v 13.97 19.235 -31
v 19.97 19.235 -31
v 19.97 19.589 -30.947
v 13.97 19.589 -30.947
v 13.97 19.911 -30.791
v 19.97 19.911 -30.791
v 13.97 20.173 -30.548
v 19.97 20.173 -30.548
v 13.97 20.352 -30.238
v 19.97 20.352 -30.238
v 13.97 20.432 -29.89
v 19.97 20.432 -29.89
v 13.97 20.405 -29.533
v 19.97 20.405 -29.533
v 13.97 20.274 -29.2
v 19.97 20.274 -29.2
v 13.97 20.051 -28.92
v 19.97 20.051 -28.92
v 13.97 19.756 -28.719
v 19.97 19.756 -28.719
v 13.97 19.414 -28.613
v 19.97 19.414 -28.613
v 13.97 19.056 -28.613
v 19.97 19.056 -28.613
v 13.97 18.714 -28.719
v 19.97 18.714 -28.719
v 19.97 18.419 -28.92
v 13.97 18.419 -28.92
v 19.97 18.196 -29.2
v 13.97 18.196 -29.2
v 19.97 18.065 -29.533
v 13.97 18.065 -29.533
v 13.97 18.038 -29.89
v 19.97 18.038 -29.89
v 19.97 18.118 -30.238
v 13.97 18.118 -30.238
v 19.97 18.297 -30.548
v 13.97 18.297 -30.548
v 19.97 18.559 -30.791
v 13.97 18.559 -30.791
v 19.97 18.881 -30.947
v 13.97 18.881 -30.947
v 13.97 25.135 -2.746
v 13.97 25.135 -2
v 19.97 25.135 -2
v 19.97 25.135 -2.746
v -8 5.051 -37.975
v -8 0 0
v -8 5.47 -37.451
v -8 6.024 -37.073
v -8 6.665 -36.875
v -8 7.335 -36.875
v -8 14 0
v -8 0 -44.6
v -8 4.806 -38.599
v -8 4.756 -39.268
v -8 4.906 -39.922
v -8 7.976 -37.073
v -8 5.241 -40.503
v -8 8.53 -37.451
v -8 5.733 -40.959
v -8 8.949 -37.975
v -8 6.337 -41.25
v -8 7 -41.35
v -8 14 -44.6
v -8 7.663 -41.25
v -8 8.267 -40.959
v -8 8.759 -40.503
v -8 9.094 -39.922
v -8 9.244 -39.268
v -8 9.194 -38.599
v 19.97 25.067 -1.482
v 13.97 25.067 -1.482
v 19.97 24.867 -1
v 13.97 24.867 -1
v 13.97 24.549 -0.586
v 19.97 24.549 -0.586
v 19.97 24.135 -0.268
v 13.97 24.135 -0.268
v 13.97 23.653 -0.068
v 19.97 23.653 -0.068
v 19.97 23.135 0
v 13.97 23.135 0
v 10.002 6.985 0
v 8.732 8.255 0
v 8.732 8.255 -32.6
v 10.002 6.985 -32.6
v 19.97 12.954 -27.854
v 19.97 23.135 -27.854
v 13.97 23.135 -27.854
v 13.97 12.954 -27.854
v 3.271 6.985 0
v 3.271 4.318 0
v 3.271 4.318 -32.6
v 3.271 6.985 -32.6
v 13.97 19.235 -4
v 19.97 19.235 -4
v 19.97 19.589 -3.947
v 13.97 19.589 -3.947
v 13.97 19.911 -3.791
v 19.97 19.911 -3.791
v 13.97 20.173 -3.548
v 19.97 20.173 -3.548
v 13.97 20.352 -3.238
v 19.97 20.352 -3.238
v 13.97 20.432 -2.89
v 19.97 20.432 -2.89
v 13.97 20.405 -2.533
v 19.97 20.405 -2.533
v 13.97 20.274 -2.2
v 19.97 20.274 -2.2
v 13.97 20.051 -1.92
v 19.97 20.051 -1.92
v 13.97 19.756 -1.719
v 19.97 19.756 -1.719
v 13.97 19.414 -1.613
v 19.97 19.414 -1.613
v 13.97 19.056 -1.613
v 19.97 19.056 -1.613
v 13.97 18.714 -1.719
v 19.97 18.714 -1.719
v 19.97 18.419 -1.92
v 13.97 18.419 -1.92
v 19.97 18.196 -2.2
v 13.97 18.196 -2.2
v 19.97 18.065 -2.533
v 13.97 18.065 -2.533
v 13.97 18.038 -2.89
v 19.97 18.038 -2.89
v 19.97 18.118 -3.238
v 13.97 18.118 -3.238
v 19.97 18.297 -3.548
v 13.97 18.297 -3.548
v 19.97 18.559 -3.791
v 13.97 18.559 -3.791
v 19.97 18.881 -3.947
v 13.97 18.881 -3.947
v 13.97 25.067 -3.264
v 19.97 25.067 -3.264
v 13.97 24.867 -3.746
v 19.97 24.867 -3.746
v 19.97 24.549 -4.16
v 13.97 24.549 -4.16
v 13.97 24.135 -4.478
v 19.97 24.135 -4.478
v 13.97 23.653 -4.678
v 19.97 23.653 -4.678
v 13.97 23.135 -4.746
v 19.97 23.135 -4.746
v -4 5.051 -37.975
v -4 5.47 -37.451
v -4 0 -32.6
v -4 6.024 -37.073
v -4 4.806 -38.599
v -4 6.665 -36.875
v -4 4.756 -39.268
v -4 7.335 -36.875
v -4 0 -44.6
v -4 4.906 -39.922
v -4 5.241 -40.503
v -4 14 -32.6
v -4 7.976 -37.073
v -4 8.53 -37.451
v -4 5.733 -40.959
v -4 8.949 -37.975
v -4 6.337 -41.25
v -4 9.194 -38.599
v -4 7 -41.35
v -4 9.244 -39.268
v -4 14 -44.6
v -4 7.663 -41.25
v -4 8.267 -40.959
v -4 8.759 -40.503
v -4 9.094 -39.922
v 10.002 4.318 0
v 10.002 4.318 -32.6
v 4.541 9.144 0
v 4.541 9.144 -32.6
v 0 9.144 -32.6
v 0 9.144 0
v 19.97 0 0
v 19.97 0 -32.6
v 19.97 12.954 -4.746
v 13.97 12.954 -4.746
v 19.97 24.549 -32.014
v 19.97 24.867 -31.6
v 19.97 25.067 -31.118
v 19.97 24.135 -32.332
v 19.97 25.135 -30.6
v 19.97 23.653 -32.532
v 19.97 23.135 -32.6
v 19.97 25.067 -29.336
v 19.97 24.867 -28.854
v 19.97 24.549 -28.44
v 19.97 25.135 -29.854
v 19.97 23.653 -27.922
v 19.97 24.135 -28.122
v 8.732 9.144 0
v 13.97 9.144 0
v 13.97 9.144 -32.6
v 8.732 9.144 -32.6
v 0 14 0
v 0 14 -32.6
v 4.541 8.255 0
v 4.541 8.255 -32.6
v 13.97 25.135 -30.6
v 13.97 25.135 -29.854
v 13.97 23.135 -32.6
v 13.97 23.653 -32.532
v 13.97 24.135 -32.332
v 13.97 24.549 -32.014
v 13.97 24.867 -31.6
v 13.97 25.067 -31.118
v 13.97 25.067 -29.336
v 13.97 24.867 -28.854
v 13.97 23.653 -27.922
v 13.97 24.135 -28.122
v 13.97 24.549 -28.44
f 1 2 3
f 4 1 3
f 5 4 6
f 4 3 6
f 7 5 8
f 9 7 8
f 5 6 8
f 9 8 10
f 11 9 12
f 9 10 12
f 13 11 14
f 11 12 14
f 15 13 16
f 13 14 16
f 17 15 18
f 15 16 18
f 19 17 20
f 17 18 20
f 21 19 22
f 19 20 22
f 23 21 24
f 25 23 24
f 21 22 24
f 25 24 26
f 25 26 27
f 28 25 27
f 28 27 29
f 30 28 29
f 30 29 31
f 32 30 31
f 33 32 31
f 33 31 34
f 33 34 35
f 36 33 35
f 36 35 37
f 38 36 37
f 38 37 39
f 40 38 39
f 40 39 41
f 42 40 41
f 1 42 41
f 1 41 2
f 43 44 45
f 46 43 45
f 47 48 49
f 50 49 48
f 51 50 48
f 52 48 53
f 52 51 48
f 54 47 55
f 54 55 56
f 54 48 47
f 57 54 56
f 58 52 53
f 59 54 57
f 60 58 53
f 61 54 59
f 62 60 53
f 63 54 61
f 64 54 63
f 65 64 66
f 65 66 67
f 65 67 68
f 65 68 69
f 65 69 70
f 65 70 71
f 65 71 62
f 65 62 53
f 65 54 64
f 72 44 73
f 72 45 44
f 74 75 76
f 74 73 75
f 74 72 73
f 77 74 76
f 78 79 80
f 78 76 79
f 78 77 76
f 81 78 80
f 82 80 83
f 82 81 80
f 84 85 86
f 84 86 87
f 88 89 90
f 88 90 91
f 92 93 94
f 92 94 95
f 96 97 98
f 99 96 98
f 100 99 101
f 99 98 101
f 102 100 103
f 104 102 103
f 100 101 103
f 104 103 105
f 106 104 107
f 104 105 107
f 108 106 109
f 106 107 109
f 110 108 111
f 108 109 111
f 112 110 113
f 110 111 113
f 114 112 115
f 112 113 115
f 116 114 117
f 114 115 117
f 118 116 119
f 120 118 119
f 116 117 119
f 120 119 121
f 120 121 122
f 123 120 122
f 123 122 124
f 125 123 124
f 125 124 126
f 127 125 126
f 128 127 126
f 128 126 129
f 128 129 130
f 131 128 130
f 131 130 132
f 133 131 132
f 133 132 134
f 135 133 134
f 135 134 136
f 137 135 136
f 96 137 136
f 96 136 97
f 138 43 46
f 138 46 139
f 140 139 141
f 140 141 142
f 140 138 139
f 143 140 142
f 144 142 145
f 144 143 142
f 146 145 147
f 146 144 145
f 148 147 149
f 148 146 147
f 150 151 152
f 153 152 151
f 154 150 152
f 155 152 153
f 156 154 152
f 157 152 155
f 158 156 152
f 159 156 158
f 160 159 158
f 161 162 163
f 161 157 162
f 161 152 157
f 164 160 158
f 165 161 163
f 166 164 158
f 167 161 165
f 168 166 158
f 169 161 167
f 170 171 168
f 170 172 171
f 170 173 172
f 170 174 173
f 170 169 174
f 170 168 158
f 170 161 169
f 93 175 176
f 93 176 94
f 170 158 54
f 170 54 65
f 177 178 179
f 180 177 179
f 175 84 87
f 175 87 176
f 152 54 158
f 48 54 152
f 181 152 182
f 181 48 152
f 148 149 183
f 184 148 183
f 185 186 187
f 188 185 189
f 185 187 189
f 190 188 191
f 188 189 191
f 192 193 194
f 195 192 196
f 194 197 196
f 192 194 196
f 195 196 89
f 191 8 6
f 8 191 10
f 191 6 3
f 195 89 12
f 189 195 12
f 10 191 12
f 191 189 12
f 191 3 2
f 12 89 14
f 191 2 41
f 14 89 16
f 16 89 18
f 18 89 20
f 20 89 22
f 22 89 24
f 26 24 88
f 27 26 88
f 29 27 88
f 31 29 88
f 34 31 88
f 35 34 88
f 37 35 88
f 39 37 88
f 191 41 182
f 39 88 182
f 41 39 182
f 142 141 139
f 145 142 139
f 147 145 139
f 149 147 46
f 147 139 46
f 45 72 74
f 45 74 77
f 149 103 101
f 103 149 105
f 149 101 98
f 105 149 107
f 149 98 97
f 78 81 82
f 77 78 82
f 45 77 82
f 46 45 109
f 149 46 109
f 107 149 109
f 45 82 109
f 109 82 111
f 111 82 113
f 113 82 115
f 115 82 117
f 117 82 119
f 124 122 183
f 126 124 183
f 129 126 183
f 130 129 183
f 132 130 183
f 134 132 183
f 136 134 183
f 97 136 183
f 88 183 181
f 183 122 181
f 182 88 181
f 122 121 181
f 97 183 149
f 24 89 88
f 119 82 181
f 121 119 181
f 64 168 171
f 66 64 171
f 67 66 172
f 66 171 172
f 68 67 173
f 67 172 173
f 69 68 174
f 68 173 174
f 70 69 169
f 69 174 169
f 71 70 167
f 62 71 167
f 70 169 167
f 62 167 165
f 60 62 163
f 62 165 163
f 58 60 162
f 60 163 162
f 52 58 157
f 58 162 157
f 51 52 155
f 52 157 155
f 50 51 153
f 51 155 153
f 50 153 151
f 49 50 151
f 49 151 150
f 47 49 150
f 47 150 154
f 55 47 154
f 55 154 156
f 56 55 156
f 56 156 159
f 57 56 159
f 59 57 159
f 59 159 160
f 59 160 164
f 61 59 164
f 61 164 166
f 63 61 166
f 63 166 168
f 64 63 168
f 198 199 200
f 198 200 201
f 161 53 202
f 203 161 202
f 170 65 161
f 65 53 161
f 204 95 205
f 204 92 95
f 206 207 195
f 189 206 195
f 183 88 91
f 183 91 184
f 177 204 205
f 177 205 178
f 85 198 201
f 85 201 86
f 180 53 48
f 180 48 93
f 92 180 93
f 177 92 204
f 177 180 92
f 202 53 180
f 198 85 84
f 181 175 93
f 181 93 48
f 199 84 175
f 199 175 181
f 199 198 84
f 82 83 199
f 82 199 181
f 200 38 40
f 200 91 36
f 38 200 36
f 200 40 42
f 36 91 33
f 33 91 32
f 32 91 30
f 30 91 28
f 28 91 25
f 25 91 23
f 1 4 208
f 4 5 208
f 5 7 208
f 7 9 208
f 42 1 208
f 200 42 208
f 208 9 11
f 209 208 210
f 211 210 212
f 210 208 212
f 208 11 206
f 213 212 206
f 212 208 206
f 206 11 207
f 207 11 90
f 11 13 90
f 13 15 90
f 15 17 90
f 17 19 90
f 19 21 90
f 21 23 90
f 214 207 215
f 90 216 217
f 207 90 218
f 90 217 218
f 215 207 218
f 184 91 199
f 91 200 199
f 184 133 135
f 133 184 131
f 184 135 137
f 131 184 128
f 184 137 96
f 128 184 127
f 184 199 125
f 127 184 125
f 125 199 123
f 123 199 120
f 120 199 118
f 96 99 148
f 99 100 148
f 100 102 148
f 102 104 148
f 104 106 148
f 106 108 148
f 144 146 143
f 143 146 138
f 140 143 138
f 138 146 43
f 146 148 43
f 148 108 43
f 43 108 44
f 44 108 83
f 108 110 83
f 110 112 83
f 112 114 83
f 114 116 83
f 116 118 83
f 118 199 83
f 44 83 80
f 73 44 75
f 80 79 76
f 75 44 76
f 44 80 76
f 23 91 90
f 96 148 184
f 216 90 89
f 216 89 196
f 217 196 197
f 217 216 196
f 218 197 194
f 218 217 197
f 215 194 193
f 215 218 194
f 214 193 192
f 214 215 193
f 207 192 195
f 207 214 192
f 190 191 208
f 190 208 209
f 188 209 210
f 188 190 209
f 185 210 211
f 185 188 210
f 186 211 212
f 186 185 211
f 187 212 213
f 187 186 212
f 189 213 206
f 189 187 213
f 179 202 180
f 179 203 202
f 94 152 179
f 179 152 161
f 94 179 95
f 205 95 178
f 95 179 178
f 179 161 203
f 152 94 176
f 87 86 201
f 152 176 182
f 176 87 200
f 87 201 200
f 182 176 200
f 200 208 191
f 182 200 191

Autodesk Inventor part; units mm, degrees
ref_plane "YZ Plane" through (0, 0, 0) normal (1, 0, 0) x (0, 1, 0)
ref_plane "XZ Plane" through (0, 0, 0) normal (0, 1, 0) x (-1, 0, 0)
ref_plane "XY Plane" through (0, 0, 0) normal (0, 0, 1) x (1, 0, 0)
sketch "Náčrt1" plane through (0, 0, 0) normal (0, 0, 1) x (1, 0, 0)
  line L0 (13.97, 23.865) -> (13.97, 9.144)
  line L1 (0, 9.144) -> (0, 0)
  line L2 (4.5409, 9.144) -> (0, 9.144)
  line L3 (4.5409, 8.255) -> (4.5409, 9.144)
  line L4 (3.2709, 6.985) -> (4.5409, 8.255)
  line L5 (3.2709, 4.318) -> (3.2709, 6.985)
  line L6 (8.7319, 9.144) -> (8.7319, 8.255)
  line L7 (13.97, 9.144) -> (8.7319, 9.144)
  line L8 (8.7319, 8.255) -> (10.0019, 6.985)
  line L9 (10.0019, 6.985) -> (10.0019, 4.318)
  line L10 (10.0019, 4.318) -> (3.2709, 4.318)
  line L11 (0, 0) -> (19.97, 0)
  line L12 (13.97, 22.5956) -> (13.97, 25.1349)
  line L13 (13.97, 20.4353) -> (13.97, 18.035)
  line L14 (13.97, 25.1349) -> (19.97, 25.1349)
  line L15 (19.97, 25.1349) -> (19.97, 0)
extrude "Vysunutí1" add sketch "Náčrt1" against normal blind 32.6
sketch "Náčrt2" plane through (19.97, 0, 0) normal (1, 0, 0) x (0, 0, -1)
  line L0 (0, 25.1349) -> (32.6, 25.1349) projected
  line L1 (16.3, 25.1349) -> (4.746, 25.1349)
  line L2 (4.746, 25.1349) -> (4.746, 12.9539)
  line L3 (16.3, 25.1349) -> (27.854, 25.1349)
  line L4 (27.854, 25.1349) -> (27.854, 12.9539)
  line L5 (27.854, 12.9539) -> (4.746, 12.9539)
  circle A0 centre (2.8, 19.2349) radius 1.2
  line L6 (16.3, 25.1349) -> (16.3, 15.9225)
  circle A1 centre (29.8, 19.2349) radius 1.2
  point P0 (0, 0)
  point P1 (4.746, 19.0444)
  dimension "d2" = 11.554
  dimension "d3" = 12.181
  dimension "d4" = 11.554
  dimension "d7" = 2.4
  dimension "d8" = 5.9
  dimension "d9" = 1.946
extrude "Vysunutí2" cut sketch "Náčrt2" against normal blind 32.6 contours L0 L4 L5 L2
extrude "Vysunutí3" cut sketch "Náčrt2" against normal blind 32.6 contours A0 | A1
fillet "Zaoblení1" radius 2 4 edges at (16.97, 25.1349, 0) (16.97, 25.1349, -4.746) (16.97, 25.1349, -27.854) (16.97, 25.1349, -32.6)
sketch "Náčrt3" plane through (0, 0, 0) normal (0, -1, 0) x (1, 0, 0)
  point P0 (0, 0)
sketch "Náčrt4" plane through (0, 0, 0) normal (0, 0, 1) x (1, 0, 0)
  line L0 (13.97, 23.1349) -> (19.97, 23.1349) projected
  line L1 (13.97, 23.1349) -> (13.97, 9.144) projected
  line L2 (13.97, 9.144) -> (8.7319, 9.144) projected
  line L3 (8.7319, 9.144) -> (8.7319, 8.255) projected
  line L4 (8.7319, 8.255) -> (10.0019, 6.985) projected
  line L5 (10.0019, 6.985) -> (10.0019, 4.318) projected
  line L6 (10.0019, 4.318) -> (3.2709, 4.318) projected
  line L7 (3.2709, 4.318) -> (3.2709, 6.985) projected
  line L8 (3.2709, 6.985) -> (4.5409, 8.255) projected
  line L9 (4.5409, 8.255) -> (4.5409, 9.144) projected
  line L10 (4.5409, 9.144) -> (0, 9.144) projected
  line L11 (0, 9.144) -> (0, 0) projected
  line L12 (0, 0) -> (19.97, 0) projected
  line L13 (19.97, 0) -> (19.97, 23.1349) projected
  line L14 (0, 0) -> (-8, 0)
  line L15 (-8, 0) -> (-8, 14)
  line L16 (-8, 14) -> (0, 14)
  line L17 (0, 14) -> (0, 0)
  dimension "d13" = 14
  dimension "d14" = 8
extrude "Vysunutí4" add sketch "Náčrt4" along normal blind 12 and the other way blind 32.6 contours L14 L15 L16 L17 L11
sketch "Náčrt5" plane through (0, 0, 0) normal (1, 0, 0) x (0, 0, -1)
  line L0 (0, 9.144) -> (0, 0) projected
  line L1 (0, 9.144) -> (32.6, 9.144) projected
  line L2 (32.6, 14) -> (32.6, 9.144) projected
  line L3 (32.6, 14) -> (-12, 14) projected
  line L4 (-12, 0) -> (-12, 14) projected
  line L5 (0, 0) -> (-12, 0) projected
  circle A0 centre (-6.5, 7) radius 2.25
  line L6 (27.854, 12.9539) -> (4.746, 12.9539) projected
  line L7 (16.3, 12.9539) -> (16.3, -5.3216)
  line L8 (32.6, 9.144) -> (32.6, 0)
  line L9 (44.6, 0) -> (44.6, 14)
  line L10 (32.6, 0) -> (44.6, 0)
  circle A1 centre (39.1, 7) radius 2.25
  line L11 (44.6, 14) -> (32.6, 14)
  line L12 (32.6, 14) -> (32.6, 0)
  dimension "d19" = 4.5
  dimension "d20" = 7
  dimension "d21" = 5.5
extrude "Vysunutí5" add sketch "Náčrt5" against normal up to surface (8 mm away) contours L2 L11 L9 L10 L8 | A0
sketch "Náčrt6" plane through (0, 0, 12) normal (0, 0, 1) x (1, 0, 0)
  line L0 (-8, 14) -> (-8, 0) projected
  line L1 (-8, 0) -> (0, 0) projected
  line L2 (0, 0) -> (0, 14) projected
  line L3 (0, 14) -> (-8, 14) projected
  line L4 (0, 14) -> (-4, 14)
  line L5 (-4, 14) -> (-4, 0)
  line L6 (-4, 0) -> (0, 0)
  line L7 (0, 0) -> (0, 14)
  dimension "d24" = 4
extrude "Vysunutí6" cut sketch "Náčrt6" against normal blind 12 contours L3 L2 L1 L5
extrude "Vysunutí7" cut sketch "Náčrt5" against normal blind 4 contours L2 L11 L9 L10 L8
sketch "Náčrt7" plane through (0, 0, 12) normal (0, 0, 1) x (1, 0, 0)
  line L0 (-4, 0) -> (-4, 14) projected
  line L1 (-4, 14) -> (-8, 14) projected
  line L2 (-8, 14) -> (-8, 0) projected
  line L3 (-8, 0) -> (-4, 0) projected
  point P0 (0, 0)
extrude "Vysunutí8" cut sketch "Náčrt7" against normal up to surface (12 mm away)
properties part number "Motor_holder" material "Měď"
